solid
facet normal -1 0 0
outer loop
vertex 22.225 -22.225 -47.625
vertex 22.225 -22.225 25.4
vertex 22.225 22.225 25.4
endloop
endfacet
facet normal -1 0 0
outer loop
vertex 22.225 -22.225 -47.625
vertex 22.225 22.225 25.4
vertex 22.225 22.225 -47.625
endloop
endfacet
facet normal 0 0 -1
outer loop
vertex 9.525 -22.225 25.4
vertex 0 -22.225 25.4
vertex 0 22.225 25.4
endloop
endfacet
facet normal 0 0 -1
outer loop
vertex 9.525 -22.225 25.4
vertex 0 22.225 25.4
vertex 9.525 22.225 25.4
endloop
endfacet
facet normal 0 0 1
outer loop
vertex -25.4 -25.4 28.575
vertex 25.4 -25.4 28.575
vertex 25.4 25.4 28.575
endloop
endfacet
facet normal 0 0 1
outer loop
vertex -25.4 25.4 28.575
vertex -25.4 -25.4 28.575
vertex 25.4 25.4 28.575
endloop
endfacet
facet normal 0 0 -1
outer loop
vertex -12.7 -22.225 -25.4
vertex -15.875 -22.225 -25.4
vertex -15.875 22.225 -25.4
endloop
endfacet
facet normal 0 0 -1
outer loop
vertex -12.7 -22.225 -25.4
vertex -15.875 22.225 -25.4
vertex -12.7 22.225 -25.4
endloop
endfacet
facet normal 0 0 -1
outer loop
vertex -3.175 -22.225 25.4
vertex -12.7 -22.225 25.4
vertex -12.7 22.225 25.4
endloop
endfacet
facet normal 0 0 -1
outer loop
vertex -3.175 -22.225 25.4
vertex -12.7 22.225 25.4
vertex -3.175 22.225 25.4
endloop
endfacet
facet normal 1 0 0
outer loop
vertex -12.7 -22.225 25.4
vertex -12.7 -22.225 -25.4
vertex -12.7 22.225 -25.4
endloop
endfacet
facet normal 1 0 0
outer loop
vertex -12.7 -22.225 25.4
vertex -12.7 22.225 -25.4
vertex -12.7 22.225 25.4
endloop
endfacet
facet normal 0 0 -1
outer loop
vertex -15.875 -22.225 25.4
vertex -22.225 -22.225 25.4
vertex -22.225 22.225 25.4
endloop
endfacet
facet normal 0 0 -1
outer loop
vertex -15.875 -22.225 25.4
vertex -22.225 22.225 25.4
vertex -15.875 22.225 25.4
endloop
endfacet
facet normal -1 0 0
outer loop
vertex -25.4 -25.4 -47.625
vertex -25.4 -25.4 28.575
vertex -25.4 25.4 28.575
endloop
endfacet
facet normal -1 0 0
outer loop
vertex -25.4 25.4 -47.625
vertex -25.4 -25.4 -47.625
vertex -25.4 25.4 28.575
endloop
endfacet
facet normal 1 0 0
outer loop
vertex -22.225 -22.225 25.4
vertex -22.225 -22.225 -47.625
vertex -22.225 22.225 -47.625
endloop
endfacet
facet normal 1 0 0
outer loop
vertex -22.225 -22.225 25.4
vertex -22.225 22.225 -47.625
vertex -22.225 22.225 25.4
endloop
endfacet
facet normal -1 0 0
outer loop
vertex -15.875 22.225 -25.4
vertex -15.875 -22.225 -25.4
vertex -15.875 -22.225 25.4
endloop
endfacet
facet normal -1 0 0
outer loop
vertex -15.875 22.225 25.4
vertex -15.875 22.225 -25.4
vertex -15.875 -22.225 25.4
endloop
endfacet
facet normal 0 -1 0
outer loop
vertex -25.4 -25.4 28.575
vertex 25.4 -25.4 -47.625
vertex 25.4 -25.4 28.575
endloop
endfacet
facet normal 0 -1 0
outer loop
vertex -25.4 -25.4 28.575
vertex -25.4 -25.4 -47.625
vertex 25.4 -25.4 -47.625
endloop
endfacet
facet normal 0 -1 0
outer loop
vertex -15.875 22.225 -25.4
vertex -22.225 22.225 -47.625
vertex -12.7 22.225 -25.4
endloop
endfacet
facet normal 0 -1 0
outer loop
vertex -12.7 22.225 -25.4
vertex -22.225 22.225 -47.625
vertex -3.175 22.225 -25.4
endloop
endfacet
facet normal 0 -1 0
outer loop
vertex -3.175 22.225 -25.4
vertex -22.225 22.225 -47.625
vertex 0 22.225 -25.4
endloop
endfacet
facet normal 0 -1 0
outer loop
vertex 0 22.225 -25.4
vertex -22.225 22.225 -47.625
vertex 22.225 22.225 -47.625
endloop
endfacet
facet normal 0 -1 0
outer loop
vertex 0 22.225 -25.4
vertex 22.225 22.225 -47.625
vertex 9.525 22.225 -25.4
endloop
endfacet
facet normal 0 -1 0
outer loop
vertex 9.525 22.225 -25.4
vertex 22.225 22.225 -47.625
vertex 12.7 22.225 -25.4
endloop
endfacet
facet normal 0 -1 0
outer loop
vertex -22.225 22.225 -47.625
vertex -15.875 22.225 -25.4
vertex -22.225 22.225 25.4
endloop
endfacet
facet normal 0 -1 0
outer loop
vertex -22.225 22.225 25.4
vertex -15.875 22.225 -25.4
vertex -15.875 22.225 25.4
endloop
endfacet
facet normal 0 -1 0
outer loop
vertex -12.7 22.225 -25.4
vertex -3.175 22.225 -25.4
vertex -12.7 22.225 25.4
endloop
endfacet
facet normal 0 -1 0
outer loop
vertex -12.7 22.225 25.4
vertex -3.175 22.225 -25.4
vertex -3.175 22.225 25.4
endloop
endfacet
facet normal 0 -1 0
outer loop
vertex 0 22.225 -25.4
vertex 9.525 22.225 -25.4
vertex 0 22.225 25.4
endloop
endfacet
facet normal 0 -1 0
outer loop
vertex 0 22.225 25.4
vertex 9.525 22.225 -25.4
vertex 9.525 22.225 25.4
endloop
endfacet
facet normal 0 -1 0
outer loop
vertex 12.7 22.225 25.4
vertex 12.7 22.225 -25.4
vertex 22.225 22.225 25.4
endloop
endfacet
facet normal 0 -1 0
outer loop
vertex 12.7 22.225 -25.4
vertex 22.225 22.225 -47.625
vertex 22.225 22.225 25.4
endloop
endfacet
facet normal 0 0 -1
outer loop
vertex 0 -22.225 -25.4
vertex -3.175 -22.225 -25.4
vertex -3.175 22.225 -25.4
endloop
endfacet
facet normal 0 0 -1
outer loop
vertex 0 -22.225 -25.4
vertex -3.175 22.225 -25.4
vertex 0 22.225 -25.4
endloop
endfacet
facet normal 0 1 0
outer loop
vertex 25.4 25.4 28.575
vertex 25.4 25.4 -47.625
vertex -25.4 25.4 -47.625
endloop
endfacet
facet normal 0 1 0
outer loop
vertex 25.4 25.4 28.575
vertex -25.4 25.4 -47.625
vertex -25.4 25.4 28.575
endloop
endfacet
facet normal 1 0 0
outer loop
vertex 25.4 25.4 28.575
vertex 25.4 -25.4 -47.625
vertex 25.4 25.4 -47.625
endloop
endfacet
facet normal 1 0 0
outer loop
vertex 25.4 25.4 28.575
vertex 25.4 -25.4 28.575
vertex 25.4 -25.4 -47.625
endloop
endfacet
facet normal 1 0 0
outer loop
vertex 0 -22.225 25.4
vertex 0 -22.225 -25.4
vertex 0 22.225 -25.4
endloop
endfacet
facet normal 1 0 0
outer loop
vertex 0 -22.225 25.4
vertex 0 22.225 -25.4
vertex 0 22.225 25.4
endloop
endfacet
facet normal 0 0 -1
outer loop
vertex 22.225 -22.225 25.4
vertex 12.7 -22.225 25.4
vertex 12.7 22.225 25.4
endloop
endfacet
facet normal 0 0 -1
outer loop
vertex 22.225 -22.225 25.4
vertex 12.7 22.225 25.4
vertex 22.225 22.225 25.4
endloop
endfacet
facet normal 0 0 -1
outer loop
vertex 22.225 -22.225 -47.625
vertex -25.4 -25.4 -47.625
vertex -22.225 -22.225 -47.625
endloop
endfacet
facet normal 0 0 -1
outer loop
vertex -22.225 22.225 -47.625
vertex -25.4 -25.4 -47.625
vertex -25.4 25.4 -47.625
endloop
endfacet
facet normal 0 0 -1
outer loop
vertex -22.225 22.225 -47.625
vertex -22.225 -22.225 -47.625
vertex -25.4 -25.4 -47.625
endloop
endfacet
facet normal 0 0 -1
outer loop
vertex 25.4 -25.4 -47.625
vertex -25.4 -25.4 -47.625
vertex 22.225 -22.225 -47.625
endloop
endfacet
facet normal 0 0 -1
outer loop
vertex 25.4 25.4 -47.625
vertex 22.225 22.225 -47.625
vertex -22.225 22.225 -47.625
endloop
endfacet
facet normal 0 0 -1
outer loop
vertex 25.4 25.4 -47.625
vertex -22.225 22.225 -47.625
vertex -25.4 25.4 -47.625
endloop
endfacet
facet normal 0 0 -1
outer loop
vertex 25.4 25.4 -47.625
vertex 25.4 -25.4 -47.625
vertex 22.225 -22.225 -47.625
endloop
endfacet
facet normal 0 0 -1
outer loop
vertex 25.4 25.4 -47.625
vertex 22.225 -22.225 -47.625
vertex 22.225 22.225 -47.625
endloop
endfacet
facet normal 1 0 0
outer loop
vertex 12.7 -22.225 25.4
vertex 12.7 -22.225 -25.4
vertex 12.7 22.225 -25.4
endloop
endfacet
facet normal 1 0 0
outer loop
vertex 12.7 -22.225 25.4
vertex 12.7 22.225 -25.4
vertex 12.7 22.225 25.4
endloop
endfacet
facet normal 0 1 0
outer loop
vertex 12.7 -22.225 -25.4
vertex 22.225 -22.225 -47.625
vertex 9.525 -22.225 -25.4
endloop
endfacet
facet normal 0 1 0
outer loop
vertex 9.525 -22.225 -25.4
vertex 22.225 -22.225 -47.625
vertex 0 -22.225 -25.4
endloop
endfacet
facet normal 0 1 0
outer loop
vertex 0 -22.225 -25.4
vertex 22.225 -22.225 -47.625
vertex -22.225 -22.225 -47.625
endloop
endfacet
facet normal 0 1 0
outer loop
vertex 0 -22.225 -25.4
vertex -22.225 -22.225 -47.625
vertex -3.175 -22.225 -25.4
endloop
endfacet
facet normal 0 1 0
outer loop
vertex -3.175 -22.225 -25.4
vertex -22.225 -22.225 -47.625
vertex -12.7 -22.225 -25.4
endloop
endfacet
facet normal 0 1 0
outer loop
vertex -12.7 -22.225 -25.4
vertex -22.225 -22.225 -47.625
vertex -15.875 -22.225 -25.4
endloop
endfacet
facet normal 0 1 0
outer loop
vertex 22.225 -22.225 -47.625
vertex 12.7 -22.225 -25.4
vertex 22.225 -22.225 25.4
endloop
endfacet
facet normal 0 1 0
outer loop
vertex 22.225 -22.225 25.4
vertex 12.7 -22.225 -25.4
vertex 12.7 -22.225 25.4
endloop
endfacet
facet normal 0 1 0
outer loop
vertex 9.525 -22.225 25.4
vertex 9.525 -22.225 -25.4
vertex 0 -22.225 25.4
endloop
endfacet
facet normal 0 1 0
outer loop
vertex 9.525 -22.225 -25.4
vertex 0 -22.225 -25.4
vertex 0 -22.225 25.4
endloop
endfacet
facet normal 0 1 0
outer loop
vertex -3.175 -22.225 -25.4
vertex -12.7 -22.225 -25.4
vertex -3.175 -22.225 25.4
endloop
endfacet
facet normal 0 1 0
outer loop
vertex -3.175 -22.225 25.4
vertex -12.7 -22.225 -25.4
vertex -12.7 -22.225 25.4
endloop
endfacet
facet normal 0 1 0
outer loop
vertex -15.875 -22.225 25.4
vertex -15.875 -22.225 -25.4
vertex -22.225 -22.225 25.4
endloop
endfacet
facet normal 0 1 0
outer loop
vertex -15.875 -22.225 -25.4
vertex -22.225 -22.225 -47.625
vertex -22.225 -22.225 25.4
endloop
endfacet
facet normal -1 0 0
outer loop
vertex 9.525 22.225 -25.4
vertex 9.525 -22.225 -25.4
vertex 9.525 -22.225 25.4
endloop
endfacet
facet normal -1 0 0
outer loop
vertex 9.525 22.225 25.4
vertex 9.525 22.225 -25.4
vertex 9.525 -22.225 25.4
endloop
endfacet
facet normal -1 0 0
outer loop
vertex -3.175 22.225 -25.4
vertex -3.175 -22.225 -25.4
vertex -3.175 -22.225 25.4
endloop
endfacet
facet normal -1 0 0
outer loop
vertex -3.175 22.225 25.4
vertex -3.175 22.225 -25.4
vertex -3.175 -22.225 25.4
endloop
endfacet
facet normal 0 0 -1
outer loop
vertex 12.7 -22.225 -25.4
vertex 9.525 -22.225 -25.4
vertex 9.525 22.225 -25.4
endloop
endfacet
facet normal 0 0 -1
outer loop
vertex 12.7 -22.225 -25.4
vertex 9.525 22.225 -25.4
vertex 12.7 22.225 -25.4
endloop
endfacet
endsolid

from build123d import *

# Parameters (mm, degrees)
F0_W     = 3.175
F0_H     = 50.8
F0_H_2   = 22.225
F1_DEPTH = 22.225
F2_W     = 3.175
F2_H     = 76.2
F3_DEPTH = 25.4


# Not quite as in the source:
# - a feature names something its author has since deleted; it is built from what else it names


with BuildPart() as f1:
    # F0 (on Front) → F1 (new body, symmetric)
    with BuildSketch(Plane.XZ):
        Polygon((-3.175, 25.4), (0, 25.4), (9.525, 25.4), (12.7, 25.4), (19.4811138548, 25.4), (22.225, 25.4), (25.4, 25.4), (25.4, 28.575), (-25.4, 28.575), (-25.4, 25.4), (-22.225, 25.4), (-15.875, 25.4), (-12.7, 25.4), align=None)
        with Locations((-23.8125, 0)):
            Rectangle(F0_W, F0_H)
        with Locations((-14.2875, 0)):
            Rectangle(F0_W, F0_H)
        with Locations((23.8125, 0)):
            Rectangle(F0_W, F0_H)
        with Locations((11.1125, 0)):
            Rectangle(F0_W, F0_H)
        with Locations((-1.5875, 0)):
            Rectangle(F0_W, F0_H)
        Polygon((25.4, -25.4), (22.225, -25.4), (22.225, -47.625), (25.4, -47.625), (25.4, -39.3581977692), (25.4, -38.6990095903), (25.4, -31.6347628832), align=None)
        with Locations((-23.8125, -36.5125)):
            Rectangle(F0_W, F0_H_2)
    extrude(amount=F1_DEPTH, both=True)

    # F2 (on Right) → F3 (join, symmetric)
    with BuildSketch(Plane.YZ):
        with Locations((-23.8125, -9.525)):
            Rectangle(F2_W, F2_H)
        with Locations((23.8125, -9.525)):
            Rectangle(F2_W, F2_H)
    extrude(amount=F3_DEPTH, both=True)


solid = f1.part
